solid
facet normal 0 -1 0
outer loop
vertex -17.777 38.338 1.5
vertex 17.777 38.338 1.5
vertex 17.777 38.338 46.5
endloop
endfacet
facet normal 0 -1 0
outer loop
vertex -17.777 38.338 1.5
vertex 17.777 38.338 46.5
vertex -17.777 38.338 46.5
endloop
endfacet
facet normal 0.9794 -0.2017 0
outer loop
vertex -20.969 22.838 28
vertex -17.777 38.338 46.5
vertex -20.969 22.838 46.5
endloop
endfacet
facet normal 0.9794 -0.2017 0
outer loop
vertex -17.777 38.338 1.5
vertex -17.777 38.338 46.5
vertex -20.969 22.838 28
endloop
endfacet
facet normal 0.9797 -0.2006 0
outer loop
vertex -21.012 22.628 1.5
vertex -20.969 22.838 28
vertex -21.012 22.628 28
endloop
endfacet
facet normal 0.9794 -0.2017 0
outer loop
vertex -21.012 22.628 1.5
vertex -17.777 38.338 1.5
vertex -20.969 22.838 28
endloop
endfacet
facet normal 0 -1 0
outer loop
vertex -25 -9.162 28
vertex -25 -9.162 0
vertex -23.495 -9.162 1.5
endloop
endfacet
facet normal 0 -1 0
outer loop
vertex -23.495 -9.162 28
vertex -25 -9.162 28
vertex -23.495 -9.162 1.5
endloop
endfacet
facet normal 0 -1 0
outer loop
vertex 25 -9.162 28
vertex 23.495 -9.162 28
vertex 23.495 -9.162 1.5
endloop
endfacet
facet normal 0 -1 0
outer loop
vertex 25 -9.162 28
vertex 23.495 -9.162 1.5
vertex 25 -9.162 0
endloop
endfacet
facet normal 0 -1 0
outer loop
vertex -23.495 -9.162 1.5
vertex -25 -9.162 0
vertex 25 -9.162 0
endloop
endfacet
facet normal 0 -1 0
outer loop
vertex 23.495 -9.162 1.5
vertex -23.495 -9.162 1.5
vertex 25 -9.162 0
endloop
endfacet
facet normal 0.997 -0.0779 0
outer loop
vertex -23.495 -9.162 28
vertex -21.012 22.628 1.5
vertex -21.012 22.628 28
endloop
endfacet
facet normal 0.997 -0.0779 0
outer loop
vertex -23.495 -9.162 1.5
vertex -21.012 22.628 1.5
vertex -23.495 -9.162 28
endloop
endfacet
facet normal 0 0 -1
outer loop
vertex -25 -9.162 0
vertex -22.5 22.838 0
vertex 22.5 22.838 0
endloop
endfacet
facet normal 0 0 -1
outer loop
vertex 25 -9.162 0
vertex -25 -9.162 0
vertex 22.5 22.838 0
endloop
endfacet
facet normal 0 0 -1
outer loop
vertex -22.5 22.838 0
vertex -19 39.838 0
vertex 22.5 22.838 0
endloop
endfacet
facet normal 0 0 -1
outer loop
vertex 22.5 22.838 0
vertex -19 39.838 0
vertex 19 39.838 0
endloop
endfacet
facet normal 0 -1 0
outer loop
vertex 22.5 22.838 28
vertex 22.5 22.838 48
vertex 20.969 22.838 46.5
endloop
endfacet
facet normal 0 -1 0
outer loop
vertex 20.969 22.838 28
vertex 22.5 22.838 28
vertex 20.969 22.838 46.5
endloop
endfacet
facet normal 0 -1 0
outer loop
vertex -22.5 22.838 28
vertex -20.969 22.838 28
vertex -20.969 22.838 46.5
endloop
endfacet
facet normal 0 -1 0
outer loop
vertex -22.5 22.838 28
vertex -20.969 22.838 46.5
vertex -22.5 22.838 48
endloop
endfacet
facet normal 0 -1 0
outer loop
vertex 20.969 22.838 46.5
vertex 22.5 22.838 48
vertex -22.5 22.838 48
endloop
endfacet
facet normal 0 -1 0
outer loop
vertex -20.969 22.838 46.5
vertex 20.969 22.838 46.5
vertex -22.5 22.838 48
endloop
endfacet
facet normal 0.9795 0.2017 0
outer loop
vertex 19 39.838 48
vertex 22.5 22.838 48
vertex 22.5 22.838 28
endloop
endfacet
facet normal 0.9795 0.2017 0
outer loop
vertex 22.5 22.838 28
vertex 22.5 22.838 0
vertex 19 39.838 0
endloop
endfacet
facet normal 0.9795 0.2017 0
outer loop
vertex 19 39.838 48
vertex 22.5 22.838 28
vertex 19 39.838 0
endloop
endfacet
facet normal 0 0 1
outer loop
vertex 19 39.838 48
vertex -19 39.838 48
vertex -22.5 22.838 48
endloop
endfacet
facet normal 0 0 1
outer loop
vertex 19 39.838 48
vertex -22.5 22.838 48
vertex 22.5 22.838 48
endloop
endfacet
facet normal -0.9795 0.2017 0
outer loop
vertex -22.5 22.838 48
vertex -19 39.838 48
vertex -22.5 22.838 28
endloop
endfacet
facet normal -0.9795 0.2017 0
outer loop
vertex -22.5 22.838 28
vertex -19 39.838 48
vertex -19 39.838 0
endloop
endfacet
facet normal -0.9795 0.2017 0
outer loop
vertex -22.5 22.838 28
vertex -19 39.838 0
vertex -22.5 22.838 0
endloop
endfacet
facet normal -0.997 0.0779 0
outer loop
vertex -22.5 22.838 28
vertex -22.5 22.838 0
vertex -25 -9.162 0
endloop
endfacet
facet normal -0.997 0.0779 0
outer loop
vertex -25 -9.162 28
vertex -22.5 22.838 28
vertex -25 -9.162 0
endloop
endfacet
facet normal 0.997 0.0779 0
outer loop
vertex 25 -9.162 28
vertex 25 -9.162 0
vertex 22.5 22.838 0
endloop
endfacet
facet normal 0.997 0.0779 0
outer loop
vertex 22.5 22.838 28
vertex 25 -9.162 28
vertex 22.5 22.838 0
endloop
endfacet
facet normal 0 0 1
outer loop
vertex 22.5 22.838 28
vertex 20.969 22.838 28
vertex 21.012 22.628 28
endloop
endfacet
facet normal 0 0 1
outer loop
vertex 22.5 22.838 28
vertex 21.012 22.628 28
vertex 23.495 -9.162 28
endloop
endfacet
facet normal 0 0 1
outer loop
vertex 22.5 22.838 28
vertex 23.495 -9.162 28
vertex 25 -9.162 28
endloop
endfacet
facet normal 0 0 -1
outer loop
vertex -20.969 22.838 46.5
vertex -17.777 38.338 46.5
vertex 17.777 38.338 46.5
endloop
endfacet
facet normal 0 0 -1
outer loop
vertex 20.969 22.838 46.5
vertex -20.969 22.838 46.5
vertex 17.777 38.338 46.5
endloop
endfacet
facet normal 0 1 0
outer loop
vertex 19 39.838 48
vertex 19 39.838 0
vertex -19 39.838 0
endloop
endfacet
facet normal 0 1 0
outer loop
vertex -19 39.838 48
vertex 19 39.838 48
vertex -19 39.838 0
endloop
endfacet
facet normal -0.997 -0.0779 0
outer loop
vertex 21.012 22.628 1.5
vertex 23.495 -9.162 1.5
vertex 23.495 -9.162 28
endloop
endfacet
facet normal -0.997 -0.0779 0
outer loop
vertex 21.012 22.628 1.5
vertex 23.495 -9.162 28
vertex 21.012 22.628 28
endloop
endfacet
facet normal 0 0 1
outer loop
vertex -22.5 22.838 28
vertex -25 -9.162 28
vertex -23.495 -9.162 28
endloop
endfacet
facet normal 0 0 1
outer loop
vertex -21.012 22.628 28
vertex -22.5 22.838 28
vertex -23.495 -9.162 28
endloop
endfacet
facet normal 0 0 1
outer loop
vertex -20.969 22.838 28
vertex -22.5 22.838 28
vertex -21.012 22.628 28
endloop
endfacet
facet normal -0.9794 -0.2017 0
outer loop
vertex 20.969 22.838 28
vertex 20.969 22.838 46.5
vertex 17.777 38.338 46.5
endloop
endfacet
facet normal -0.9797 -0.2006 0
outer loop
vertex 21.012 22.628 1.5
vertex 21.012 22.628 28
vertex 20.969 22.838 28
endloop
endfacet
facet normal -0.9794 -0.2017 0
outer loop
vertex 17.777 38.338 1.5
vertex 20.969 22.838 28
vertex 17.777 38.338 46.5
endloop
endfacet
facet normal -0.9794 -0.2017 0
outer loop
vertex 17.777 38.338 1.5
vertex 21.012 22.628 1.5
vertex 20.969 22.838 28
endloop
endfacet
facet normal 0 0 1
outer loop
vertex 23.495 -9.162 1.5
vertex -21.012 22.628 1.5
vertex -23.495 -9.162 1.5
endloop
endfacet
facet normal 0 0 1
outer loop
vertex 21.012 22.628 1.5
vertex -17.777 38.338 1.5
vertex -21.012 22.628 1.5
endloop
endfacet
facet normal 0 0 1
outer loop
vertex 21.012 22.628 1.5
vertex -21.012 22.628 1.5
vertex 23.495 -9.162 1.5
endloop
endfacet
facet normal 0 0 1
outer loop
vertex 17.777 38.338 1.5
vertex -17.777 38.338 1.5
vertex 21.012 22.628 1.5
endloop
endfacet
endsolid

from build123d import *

# Parameters (mm, degrees)
F1_DEPTH = 48
F3_DEPTH = 20
F4_T     = 1.5


# Not quite as in the source:
# - a shell that OpenCascade refuses in one call is made with other operations: the cavity is built on its own and cut out


with BuildPart() as f1:
    # F0 (on Top) → F1 (new body)
    with BuildSketch(Plane.XY):
        Polygon((22.5, 22.8382229426), (-22.5, 22.8382229426), (-25, -9.1617770574), (25, -9.1617770574), align=None)
        Polygon((19, 39.8382229426), (-19, 39.8382229426), (-22.5, 22.8382229426), (22.5, 22.8382229426), align=None)
    extrude(amount=F1_DEPTH)

    # F2 (on face) → F3 (cut)
    with BuildSketch(Plane.XY.offset(48)):
        Polygon((22.5, 22.8382229426), (-22.5, 22.8382229426), (-25, -9.1617770574), (25, -9.1617770574), align=None)
    extrude(amount=-F3_DEPTH, mode=Mode.SUBTRACT)

    # F4: shell of thickness 1.5, made by hand


with BuildPart() as f4_core1:
    # F4_t2: copy of F1
    add(f1.part)

    # the walls: a layer under each face that stays
    f4_faces = [f4_core1.faces().sort_by_distance(p)[0] for p in [
        (0, 15.3382229426, 0),
        (23.75, 6.8382229426, 14),
        (-23.75, 6.8382229426, 14),
        (20.75, 31.3382229426, 24),
        (0, 39.8382229426, 24),
        (-20.75, 31.3382229426, 24),
        (0, 31.3382229426, 48),
    ]]
    thicken(f4_faces, amount=-F4_T, mode=Mode.SUBTRACT)


with BuildPart() as f1_1:
    add(f1.part)

    # what is left inside the walls is the cavity
    f4_cavity = [f4_core1.part.solids().sort_by_distance(p)[0] for p in [
        (0, 6.671556, 1.515),
    ]]
    add(f4_cavity, mode=Mode.SUBTRACT)


solid = f1_1.part
